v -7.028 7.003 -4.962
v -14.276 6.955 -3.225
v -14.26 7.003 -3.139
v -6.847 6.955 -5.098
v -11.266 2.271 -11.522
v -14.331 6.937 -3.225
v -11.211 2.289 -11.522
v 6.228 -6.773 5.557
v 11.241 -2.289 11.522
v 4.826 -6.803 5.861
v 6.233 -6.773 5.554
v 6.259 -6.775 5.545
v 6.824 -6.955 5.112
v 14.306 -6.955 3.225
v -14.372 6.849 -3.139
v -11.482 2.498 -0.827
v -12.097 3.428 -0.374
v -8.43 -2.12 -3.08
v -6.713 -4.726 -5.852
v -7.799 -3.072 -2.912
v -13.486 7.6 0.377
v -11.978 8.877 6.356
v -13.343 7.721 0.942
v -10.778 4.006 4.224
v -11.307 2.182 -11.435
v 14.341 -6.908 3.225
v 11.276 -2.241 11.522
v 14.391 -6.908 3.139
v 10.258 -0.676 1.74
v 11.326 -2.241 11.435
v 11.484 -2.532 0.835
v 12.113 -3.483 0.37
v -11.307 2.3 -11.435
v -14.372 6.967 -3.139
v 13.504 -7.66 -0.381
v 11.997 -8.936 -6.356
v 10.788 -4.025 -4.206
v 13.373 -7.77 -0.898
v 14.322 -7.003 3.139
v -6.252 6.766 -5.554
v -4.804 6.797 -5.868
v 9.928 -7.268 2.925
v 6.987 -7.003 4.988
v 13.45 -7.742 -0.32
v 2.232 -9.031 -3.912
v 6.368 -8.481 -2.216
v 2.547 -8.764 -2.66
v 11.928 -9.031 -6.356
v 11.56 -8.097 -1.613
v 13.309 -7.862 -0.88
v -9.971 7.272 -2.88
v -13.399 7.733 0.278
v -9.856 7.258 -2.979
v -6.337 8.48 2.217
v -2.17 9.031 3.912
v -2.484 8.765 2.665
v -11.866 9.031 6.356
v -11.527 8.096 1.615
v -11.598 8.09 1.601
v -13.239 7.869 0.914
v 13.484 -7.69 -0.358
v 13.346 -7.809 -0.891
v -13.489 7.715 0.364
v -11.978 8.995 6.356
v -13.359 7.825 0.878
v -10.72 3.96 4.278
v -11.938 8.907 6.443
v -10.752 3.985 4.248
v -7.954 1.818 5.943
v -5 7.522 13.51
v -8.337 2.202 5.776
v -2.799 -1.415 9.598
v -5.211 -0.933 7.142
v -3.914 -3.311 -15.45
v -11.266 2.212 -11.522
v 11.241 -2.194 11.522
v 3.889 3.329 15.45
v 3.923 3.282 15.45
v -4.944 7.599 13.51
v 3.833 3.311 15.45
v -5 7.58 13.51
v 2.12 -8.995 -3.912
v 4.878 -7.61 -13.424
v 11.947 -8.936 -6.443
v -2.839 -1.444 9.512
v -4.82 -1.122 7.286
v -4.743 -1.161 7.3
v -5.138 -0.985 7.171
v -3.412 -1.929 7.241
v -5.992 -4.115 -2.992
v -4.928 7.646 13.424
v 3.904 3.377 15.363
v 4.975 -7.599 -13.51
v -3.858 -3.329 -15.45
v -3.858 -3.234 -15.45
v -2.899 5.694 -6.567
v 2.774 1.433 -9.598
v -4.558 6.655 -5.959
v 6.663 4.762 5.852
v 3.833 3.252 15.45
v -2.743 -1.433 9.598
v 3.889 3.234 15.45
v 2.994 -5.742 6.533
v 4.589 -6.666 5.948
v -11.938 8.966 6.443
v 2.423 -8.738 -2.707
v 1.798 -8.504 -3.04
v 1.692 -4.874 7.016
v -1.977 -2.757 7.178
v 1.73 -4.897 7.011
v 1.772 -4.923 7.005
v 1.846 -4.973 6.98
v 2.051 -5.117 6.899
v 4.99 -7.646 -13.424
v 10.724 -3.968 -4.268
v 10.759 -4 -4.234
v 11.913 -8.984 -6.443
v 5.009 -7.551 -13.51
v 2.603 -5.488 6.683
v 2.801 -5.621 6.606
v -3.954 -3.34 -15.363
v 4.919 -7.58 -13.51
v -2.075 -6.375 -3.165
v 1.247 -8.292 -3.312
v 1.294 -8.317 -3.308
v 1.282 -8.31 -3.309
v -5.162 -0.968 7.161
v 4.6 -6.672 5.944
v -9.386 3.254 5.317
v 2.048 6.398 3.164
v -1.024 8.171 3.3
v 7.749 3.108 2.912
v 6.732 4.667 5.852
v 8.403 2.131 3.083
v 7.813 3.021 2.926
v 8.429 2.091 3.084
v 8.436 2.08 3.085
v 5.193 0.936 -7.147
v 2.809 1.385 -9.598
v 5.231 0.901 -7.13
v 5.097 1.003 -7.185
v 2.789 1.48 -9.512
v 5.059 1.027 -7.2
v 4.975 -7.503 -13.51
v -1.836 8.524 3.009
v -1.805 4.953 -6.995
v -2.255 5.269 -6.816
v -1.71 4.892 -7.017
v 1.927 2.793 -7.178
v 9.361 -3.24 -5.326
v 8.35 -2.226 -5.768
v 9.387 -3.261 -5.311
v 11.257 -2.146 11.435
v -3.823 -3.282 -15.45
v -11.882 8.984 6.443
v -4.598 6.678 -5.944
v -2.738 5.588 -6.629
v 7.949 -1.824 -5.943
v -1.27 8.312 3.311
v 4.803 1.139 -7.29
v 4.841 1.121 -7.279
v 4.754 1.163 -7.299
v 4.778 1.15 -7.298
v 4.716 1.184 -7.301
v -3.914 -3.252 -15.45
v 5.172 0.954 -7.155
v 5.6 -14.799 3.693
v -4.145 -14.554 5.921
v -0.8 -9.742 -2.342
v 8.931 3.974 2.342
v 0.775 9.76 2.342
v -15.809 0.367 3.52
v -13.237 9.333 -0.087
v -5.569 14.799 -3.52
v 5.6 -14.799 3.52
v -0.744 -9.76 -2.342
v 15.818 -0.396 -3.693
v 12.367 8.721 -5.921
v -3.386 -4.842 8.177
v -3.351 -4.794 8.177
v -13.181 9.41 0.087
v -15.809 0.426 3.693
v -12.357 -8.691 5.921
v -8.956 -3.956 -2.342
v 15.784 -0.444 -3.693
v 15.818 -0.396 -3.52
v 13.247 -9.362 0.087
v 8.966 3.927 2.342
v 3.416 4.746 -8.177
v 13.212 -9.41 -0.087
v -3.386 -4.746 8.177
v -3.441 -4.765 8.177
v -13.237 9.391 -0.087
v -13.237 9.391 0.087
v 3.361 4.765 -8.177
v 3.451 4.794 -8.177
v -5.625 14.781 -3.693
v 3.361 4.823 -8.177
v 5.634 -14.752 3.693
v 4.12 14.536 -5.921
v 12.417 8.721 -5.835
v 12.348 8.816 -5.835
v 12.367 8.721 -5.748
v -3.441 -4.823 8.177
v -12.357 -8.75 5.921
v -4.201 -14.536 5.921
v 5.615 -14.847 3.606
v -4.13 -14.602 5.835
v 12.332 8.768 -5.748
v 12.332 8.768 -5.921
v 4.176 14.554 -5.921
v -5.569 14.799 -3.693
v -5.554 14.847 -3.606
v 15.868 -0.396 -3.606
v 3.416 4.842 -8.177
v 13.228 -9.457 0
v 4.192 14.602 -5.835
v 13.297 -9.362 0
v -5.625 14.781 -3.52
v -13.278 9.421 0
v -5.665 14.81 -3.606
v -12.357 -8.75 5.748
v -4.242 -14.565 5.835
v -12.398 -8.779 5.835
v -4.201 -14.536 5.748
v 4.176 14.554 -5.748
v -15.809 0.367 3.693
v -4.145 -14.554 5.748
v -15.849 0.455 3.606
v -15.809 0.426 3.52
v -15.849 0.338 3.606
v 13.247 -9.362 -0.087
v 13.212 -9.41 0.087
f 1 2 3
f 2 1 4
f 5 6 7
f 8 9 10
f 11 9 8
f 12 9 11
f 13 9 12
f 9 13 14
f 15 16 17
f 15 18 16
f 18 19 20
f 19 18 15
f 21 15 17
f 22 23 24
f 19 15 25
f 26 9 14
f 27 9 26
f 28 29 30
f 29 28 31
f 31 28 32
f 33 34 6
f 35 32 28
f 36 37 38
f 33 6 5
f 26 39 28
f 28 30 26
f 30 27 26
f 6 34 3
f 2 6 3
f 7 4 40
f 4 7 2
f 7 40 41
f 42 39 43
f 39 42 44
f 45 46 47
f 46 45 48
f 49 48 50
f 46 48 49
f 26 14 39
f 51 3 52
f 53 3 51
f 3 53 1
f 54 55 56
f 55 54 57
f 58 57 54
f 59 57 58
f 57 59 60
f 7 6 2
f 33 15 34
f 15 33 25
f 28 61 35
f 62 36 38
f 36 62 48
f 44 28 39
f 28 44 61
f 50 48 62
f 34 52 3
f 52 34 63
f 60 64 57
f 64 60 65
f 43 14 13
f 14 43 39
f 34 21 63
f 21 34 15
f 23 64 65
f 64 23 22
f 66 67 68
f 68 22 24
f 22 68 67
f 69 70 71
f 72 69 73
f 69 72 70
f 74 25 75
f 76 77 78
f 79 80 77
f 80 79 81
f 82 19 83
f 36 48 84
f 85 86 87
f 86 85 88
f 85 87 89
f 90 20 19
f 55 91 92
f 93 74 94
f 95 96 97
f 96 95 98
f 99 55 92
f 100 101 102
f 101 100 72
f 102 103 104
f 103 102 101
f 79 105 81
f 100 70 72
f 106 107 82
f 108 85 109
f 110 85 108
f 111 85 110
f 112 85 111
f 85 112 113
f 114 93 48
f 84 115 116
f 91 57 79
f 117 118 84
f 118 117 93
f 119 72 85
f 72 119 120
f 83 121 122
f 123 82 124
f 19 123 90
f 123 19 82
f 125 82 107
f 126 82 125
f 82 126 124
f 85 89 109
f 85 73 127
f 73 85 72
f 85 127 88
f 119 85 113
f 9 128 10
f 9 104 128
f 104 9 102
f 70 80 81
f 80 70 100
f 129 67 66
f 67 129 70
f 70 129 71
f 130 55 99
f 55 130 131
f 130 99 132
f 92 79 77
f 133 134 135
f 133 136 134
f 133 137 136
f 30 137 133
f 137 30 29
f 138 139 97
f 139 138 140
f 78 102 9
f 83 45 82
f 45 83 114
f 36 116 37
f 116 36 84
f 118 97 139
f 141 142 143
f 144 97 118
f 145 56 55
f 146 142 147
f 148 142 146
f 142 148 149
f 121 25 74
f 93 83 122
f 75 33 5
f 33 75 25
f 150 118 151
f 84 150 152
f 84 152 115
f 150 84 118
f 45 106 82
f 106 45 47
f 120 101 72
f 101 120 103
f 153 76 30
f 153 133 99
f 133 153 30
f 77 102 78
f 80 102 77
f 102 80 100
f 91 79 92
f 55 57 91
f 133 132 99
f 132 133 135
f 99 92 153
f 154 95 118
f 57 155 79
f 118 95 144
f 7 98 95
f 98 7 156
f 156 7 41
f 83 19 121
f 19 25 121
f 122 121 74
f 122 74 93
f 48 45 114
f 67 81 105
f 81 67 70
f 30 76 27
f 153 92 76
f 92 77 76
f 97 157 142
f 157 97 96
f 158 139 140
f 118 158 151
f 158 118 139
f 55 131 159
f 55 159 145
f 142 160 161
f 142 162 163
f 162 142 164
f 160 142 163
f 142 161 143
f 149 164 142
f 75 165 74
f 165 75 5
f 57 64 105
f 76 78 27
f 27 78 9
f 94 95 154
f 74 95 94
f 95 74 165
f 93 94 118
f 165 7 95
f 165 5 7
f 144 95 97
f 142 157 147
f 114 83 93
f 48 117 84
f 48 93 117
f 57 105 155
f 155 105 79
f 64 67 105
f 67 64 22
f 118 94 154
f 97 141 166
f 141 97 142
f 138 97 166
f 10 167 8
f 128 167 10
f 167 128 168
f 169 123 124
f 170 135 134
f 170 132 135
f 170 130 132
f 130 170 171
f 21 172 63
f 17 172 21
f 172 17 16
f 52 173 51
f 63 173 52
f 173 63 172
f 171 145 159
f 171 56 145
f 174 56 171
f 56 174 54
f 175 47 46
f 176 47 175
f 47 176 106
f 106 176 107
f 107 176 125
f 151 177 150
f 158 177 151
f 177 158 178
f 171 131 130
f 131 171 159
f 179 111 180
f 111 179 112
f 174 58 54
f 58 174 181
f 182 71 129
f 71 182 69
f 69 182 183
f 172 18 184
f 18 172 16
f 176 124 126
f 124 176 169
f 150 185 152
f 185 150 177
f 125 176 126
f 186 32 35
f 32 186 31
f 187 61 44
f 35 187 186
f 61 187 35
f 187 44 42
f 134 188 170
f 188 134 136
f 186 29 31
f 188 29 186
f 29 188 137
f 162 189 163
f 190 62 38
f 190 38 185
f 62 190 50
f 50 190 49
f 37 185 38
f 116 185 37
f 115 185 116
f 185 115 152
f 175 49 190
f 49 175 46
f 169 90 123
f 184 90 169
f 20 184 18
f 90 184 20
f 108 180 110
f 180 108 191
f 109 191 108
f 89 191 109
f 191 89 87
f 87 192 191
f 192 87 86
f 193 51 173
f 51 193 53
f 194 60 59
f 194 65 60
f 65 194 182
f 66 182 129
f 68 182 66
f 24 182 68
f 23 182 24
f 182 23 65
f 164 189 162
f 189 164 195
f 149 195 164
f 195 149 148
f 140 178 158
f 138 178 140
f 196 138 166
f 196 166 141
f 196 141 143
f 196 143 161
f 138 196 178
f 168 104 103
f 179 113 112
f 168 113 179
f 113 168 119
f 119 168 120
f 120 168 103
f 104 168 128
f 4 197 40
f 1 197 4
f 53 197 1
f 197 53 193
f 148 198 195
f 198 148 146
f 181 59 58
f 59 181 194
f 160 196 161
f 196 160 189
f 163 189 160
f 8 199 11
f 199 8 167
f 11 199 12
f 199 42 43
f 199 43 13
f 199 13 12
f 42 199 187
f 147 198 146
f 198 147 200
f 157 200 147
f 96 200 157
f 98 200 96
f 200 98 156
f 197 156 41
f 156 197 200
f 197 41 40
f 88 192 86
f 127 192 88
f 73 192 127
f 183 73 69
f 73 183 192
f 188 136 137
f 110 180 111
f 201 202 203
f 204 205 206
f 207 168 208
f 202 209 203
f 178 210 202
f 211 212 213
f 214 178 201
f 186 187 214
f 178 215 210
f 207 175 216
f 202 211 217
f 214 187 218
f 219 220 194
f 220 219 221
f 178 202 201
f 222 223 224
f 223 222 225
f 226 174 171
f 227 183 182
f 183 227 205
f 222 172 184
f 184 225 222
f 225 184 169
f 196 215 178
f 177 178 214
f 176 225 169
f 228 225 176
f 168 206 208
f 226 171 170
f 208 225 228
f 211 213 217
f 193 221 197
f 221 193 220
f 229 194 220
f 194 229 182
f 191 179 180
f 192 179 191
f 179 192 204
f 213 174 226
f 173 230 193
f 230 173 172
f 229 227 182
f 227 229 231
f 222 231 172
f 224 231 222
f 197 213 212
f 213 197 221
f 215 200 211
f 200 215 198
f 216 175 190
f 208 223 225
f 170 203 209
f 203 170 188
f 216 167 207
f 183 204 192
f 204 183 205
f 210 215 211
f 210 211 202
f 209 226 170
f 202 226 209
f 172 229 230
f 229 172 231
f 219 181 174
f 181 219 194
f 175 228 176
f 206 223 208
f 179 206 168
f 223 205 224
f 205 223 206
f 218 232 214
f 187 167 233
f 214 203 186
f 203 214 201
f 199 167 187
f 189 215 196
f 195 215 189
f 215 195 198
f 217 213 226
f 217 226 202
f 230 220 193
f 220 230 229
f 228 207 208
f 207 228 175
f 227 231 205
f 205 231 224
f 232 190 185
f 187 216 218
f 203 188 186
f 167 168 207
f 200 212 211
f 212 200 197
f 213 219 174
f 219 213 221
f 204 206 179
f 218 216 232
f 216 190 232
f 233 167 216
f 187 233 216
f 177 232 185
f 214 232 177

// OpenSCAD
// Auto-generated OpenSCAD file

    inner_points = 10*[[-1.3196803278726468, 0.9362046957981746, -6.595639077981762e-13], [1.3196795770729461, -0.9362042464911885, 6.595639077981762e-13], [-0.5584491756654331, 1.4751697470422118, -0.3606158710418413], [1.5768378417073974, -0.039640907689503124, -0.360615871040774], [-1.576838592507098, 0.039641356996489185, 0.360615871040774], [0.5584484248657327, -1.4751692977352255, 0.3606158710418413], [0.41609043726663214, 1.4506701799017077, -0.5834887362276886], [1.231697502166666, 0.8720639963146739, -0.583488736227281], [-1.2316982529663667, -0.8720635470076878, 0.583488736227281], [-0.41609118806633266, -1.4506697305947214, 0.5834887362276886], [0.3400958061980706, 0.4794020290670393, -0.8090169943749945], [-0.34009655699777114, -0.47940157976005326, 0.8090169943749945], [-0.6344438067339944, 0.5039015962075438, -0.5861441291891473], [0.685236145738802, -0.43230287493713776, -0.5861441291884877], [-0.6852368965385024, 0.4323033242441238, 0.5861441291884877], [0.634443055934294, -0.5039011469005578, 0.5861441291891473], [0.07599425566871129, 0.9712683754881611, 0.22552825814730598], [0.8916013205687453, 0.3926621919011276, 0.22552825814771355], [-0.8916020713684457, -0.39266174259414155, -0.22552825814771355], [-0.07599500646841176, -0.9712679261811751, -0.22552825814730598]];

    outer_points = 10*[[0.38730796483642055, 0.32816512550448207, 1.536337911895294], [-0.38730796483642055, -0.32816512550448207, -1.536337911895294], [1.122601014421019, -0.22411714494778695, 1.1434913451842328], [0.49592356320214137, -0.7550994719364139, -1.3423556144673943], [-0.49592356320214137, 0.7550994719364139, 1.3423556144673943], [-1.122601014421019, 0.22411714494778695, -1.1434913451842328], [1.4290986323018988, -0.6907942834915881, 0.3138699504541333], [1.189729145919442, -0.8936114849757331, -0.6356390973021997], [-1.189729145919442, 0.8936114849757331, 0.6356390973021997], [-1.4290986323018988, 0.6907942834915881, -0.3138699504541333], [0.9696619025702452, 0.0, -0.24444998405369595], [-0.9696619025702452, 0.0, 0.24444998405369595], [0.6631642846893652, 0.46667713854380116, 0.5851714106764037], [0.2758563198529447, 0.1385120130393191, -0.9511665012188903], [-0.2758563198529447, -0.1385120130393191, 0.9511665012188903], [-0.6631642846893652, -0.46667713854380116, -0.5851714106764037], [0.45943672973165367, -0.6907942834915881, 0.5583199345078292], [0.2200672433491967, -0.8936114849757331, -0.3911891132485038], [-0.2200672433491967, 0.8936114849757331, 0.3911891132485038], [-0.45943672973165367, 0.6907942834915881, -0.5583199345078292]];

    // Convex hull for inner set (I)
    module inner_hull() {
        hull() {
            for (p = inner_points) {
                translate(p) sphere(r=0.1);
            }
        }
    }

    // Convex hull for outer set (O) minus inner hull (O \ I)
    module outer_minus_inner() {
        difference() {
            hull() {
                for (p = outer_points) {
                    translate(p) sphere(r=0.1);
                }
            }
            inner_hull(); // Subtract inner hull
        }
    }

    // Convex hull for outer set (O) minus all translated inner hulls
    module outer_minus_AllTranslationInner() {
        difference() {
            hull() {
                for (p = outer_points) {
                    translate(p) sphere(r=0.1);
                }
            }
            hull() {
                translate([0,0,50]) inner_hull();
                translate([0,0,-50]) inner_hull();
            }; // Subtract translated inner hulls
        }
    }

    // Difference between outer_minus_inner and outer_minus_AllTranslationInner
    module outer_minus_inner_diff() {
        difference() {
            // Outer minus inner
            difference() {
                hull() {
                    for (p = outer_points) {
                        translate(p) sphere(r=0.1);
                    }
                }
                inner_hull();
            }

            // Subtract Outer minus AllTranslationInner
            difference() {
                hull() {
                    for (p = outer_points) {
                        translate(p) sphere(r=0.1);
                    }
                }
                hull() {
                    translate([0,0,50]) inner_hull();
                    translate([0,0,-50]) inner_hull();
                };
            }
        }
    }

    // Rendering all with colors applied
    color([1, 0, 0, 0.5]) inner_hull(); // Transparent red
    color([0, 1, 0, 1]) outer_minus_AllTranslationInner(); // Opaque green
    color([1, 1, 0, 1]) outer_minus_inner_diff(); // Opaque yellow
    
